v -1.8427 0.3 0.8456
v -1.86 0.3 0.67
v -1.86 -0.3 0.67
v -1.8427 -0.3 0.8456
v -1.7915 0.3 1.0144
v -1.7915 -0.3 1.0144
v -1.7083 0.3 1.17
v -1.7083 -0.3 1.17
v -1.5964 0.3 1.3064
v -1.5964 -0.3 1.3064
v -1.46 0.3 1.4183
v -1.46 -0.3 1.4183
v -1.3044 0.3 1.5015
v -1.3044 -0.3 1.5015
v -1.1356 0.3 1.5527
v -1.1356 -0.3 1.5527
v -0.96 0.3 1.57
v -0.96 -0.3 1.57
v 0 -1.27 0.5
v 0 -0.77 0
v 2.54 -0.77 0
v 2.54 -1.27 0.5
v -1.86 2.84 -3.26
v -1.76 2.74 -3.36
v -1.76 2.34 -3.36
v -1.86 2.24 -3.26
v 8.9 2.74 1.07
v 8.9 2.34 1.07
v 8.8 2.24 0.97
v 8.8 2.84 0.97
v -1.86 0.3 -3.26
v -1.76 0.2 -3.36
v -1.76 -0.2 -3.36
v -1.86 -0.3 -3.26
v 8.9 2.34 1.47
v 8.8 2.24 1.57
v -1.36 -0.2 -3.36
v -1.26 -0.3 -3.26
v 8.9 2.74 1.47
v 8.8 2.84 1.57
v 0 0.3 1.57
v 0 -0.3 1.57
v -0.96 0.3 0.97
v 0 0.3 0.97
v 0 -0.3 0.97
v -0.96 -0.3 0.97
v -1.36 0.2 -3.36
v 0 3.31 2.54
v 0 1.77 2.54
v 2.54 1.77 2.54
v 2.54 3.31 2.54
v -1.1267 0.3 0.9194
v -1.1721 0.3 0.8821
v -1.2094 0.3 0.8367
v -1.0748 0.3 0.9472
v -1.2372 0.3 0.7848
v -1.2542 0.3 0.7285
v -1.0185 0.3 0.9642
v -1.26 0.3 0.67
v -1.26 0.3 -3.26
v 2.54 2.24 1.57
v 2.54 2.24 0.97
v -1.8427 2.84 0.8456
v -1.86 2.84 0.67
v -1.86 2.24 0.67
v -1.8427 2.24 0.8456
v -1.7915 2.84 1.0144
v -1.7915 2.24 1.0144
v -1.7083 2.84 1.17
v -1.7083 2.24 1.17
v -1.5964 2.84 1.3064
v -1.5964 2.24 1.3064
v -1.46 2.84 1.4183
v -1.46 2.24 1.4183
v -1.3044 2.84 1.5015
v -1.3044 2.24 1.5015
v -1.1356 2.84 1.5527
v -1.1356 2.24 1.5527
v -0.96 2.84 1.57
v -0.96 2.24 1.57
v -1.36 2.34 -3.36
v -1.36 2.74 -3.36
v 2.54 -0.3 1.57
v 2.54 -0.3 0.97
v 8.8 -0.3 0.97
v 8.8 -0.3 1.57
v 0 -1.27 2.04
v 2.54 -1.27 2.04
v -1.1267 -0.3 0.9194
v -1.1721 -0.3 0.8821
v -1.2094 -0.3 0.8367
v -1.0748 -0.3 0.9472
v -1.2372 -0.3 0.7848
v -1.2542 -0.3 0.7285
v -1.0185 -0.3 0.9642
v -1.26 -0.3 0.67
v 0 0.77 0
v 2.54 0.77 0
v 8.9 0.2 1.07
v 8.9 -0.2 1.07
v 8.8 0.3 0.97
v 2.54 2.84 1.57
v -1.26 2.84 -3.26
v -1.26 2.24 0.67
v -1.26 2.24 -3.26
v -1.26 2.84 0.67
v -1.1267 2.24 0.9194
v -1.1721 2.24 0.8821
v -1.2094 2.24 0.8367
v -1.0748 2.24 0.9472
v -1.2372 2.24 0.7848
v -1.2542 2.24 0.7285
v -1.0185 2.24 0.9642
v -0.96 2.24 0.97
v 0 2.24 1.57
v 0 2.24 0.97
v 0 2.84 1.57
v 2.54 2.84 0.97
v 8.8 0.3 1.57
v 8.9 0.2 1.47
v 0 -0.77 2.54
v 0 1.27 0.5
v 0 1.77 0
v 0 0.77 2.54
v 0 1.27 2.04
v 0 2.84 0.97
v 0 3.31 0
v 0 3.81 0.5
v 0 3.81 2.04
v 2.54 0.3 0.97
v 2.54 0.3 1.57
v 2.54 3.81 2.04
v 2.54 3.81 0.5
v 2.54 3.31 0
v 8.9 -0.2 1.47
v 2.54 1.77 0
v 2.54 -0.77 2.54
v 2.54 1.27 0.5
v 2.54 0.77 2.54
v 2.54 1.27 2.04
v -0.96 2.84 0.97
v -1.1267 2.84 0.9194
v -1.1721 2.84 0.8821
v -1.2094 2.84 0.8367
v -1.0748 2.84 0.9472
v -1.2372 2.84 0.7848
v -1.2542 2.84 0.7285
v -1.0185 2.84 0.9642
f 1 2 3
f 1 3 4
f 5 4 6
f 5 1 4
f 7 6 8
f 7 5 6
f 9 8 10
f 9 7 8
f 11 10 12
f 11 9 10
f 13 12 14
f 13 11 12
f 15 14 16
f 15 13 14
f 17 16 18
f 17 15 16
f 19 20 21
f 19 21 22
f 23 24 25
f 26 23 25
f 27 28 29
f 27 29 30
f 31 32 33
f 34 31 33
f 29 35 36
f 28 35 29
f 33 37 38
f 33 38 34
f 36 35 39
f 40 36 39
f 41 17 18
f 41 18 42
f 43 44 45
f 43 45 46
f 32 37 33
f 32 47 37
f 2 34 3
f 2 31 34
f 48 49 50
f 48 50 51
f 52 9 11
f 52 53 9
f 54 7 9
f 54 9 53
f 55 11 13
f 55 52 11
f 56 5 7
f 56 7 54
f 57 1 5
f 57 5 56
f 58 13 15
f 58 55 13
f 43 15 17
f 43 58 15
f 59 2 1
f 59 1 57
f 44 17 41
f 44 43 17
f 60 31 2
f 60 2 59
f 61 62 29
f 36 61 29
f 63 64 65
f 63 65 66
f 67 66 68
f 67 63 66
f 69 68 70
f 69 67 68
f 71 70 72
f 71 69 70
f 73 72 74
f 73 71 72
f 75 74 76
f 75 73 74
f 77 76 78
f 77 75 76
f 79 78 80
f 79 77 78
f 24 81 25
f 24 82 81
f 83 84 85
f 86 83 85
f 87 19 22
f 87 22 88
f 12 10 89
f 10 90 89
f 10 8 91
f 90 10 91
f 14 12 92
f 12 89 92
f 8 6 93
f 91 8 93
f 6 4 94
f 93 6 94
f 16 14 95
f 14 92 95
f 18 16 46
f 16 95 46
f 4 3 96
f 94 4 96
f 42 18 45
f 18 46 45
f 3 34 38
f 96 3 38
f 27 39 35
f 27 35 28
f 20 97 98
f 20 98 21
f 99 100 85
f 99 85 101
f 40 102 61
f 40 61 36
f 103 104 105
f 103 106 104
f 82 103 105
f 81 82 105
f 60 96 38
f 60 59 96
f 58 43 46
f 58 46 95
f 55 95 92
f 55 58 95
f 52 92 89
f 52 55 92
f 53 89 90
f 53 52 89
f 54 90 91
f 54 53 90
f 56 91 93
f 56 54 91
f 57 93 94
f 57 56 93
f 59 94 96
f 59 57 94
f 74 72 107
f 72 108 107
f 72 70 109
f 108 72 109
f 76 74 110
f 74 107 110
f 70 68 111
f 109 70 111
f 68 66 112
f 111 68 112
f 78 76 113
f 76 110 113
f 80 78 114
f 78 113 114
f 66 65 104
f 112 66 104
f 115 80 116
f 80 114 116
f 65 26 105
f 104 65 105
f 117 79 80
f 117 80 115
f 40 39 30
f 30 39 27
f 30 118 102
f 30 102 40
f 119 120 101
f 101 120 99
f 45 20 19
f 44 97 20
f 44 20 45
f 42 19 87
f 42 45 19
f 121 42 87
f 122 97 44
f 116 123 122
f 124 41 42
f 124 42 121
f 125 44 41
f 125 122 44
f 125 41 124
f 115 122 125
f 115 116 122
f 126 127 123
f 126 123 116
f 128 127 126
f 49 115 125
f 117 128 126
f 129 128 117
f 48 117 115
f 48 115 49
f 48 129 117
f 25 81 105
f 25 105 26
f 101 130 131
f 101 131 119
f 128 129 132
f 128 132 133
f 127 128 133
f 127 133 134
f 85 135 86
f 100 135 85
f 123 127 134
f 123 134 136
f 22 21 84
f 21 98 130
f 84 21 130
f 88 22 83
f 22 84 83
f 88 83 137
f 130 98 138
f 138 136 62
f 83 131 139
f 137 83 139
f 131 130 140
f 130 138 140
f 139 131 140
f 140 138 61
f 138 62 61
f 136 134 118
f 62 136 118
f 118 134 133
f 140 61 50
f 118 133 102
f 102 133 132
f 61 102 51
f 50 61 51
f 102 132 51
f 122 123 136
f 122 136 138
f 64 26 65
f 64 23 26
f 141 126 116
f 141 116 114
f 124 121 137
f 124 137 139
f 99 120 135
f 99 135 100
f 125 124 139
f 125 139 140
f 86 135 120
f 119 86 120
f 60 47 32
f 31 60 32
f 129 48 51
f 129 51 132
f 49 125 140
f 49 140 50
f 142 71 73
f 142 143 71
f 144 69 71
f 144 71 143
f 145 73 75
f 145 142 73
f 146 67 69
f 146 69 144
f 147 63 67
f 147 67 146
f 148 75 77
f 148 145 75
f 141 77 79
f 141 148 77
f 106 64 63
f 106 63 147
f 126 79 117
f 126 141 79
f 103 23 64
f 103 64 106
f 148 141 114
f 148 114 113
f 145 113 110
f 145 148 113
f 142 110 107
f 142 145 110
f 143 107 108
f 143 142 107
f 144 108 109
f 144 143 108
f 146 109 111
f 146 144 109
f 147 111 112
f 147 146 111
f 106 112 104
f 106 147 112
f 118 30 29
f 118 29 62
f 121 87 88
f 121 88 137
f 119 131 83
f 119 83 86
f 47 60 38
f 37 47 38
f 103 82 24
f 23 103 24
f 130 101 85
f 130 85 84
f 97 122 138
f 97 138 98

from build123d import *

# Parameters (mm, degrees)
PLASTIC_DEPTH   = 2.54
CONTACT_DEPTH   = 0.3
CHAMFER1_SIZE   = 0.1
LPATTERN1_COUNT = 2
LPATTERN1_PITCH = 2.54


with BuildPart() as part:
    # Sketch1 → Plastic (new body)
    with BuildSketch(Plane(origin=(0, 0, 0), x_dir=(0, 0, -1), z_dir=(1, 0, 0))):
        Polygon((-2.04, 1.27), (-0.5, 1.27), (0, 0.77), (0, -0.77), (-0.5, -1.27), (-2.04, -1.27), (-2.54, -0.77), (-2.54, 0.77), align=None)
    extrude(amount=PLASTIC_DEPTH)

    # Sketch2 → Contact (add, symmetric)
    with BuildSketch(Plane(origin=(0, 0, 0), x_dir=(1, 0, 0), z_dir=(0, 1, 0))):
        with BuildLine():
            Line((-1.86, 3.36), (-1.86, -0.67))
            ThreePointArc((-1.86, -0.67), (-1.596396103, -1.306396103), (-0.96, -1.57))
            Line((-0.96, -1.57), (8.9, -1.57))
            Line((8.9, -1.57), (8.9, -0.97))
            Line((8.9, -0.97), (-0.96, -0.97))
            ThreePointArc((-0.96, -0.97), (-1.172132034, -0.882132034), (-1.26, -0.67))
            Line((-1.26, -0.67), (-1.26, 3.36))
            Line((-1.26, 3.36), (-1.86, 3.36))
        make_face()
    extrude(amount=CONTACT_DEPTH, both=True)

    # Chamfer1
    chamfer1_edges = [part.edges().sort_by_distance(p)[0] for p in [
        (8.9, 0, 0.97),
        (8.9, 0.3, 1.27),
        (-1.56, -0.3, -3.36),
        (-1.26, 0, -3.36),
        (-1.86, 0, -3.36),
        (8.9, -0.3, 1.27),
        (8.9, 0, 1.57),
        (-1.56, 0.3, -3.36),
    ]]
    chamfer(chamfer1_edges, length=CHAMFER1_SIZE)

    # LPattern1: part ×2


with BuildPart() as part_1:
    add(part.part)
    with Locations(*[(0, i * LPATTERN1_PITCH, 0) for i in range(1, LPATTERN1_COUNT)]):
        add(part.part)


solid = part_1.part
